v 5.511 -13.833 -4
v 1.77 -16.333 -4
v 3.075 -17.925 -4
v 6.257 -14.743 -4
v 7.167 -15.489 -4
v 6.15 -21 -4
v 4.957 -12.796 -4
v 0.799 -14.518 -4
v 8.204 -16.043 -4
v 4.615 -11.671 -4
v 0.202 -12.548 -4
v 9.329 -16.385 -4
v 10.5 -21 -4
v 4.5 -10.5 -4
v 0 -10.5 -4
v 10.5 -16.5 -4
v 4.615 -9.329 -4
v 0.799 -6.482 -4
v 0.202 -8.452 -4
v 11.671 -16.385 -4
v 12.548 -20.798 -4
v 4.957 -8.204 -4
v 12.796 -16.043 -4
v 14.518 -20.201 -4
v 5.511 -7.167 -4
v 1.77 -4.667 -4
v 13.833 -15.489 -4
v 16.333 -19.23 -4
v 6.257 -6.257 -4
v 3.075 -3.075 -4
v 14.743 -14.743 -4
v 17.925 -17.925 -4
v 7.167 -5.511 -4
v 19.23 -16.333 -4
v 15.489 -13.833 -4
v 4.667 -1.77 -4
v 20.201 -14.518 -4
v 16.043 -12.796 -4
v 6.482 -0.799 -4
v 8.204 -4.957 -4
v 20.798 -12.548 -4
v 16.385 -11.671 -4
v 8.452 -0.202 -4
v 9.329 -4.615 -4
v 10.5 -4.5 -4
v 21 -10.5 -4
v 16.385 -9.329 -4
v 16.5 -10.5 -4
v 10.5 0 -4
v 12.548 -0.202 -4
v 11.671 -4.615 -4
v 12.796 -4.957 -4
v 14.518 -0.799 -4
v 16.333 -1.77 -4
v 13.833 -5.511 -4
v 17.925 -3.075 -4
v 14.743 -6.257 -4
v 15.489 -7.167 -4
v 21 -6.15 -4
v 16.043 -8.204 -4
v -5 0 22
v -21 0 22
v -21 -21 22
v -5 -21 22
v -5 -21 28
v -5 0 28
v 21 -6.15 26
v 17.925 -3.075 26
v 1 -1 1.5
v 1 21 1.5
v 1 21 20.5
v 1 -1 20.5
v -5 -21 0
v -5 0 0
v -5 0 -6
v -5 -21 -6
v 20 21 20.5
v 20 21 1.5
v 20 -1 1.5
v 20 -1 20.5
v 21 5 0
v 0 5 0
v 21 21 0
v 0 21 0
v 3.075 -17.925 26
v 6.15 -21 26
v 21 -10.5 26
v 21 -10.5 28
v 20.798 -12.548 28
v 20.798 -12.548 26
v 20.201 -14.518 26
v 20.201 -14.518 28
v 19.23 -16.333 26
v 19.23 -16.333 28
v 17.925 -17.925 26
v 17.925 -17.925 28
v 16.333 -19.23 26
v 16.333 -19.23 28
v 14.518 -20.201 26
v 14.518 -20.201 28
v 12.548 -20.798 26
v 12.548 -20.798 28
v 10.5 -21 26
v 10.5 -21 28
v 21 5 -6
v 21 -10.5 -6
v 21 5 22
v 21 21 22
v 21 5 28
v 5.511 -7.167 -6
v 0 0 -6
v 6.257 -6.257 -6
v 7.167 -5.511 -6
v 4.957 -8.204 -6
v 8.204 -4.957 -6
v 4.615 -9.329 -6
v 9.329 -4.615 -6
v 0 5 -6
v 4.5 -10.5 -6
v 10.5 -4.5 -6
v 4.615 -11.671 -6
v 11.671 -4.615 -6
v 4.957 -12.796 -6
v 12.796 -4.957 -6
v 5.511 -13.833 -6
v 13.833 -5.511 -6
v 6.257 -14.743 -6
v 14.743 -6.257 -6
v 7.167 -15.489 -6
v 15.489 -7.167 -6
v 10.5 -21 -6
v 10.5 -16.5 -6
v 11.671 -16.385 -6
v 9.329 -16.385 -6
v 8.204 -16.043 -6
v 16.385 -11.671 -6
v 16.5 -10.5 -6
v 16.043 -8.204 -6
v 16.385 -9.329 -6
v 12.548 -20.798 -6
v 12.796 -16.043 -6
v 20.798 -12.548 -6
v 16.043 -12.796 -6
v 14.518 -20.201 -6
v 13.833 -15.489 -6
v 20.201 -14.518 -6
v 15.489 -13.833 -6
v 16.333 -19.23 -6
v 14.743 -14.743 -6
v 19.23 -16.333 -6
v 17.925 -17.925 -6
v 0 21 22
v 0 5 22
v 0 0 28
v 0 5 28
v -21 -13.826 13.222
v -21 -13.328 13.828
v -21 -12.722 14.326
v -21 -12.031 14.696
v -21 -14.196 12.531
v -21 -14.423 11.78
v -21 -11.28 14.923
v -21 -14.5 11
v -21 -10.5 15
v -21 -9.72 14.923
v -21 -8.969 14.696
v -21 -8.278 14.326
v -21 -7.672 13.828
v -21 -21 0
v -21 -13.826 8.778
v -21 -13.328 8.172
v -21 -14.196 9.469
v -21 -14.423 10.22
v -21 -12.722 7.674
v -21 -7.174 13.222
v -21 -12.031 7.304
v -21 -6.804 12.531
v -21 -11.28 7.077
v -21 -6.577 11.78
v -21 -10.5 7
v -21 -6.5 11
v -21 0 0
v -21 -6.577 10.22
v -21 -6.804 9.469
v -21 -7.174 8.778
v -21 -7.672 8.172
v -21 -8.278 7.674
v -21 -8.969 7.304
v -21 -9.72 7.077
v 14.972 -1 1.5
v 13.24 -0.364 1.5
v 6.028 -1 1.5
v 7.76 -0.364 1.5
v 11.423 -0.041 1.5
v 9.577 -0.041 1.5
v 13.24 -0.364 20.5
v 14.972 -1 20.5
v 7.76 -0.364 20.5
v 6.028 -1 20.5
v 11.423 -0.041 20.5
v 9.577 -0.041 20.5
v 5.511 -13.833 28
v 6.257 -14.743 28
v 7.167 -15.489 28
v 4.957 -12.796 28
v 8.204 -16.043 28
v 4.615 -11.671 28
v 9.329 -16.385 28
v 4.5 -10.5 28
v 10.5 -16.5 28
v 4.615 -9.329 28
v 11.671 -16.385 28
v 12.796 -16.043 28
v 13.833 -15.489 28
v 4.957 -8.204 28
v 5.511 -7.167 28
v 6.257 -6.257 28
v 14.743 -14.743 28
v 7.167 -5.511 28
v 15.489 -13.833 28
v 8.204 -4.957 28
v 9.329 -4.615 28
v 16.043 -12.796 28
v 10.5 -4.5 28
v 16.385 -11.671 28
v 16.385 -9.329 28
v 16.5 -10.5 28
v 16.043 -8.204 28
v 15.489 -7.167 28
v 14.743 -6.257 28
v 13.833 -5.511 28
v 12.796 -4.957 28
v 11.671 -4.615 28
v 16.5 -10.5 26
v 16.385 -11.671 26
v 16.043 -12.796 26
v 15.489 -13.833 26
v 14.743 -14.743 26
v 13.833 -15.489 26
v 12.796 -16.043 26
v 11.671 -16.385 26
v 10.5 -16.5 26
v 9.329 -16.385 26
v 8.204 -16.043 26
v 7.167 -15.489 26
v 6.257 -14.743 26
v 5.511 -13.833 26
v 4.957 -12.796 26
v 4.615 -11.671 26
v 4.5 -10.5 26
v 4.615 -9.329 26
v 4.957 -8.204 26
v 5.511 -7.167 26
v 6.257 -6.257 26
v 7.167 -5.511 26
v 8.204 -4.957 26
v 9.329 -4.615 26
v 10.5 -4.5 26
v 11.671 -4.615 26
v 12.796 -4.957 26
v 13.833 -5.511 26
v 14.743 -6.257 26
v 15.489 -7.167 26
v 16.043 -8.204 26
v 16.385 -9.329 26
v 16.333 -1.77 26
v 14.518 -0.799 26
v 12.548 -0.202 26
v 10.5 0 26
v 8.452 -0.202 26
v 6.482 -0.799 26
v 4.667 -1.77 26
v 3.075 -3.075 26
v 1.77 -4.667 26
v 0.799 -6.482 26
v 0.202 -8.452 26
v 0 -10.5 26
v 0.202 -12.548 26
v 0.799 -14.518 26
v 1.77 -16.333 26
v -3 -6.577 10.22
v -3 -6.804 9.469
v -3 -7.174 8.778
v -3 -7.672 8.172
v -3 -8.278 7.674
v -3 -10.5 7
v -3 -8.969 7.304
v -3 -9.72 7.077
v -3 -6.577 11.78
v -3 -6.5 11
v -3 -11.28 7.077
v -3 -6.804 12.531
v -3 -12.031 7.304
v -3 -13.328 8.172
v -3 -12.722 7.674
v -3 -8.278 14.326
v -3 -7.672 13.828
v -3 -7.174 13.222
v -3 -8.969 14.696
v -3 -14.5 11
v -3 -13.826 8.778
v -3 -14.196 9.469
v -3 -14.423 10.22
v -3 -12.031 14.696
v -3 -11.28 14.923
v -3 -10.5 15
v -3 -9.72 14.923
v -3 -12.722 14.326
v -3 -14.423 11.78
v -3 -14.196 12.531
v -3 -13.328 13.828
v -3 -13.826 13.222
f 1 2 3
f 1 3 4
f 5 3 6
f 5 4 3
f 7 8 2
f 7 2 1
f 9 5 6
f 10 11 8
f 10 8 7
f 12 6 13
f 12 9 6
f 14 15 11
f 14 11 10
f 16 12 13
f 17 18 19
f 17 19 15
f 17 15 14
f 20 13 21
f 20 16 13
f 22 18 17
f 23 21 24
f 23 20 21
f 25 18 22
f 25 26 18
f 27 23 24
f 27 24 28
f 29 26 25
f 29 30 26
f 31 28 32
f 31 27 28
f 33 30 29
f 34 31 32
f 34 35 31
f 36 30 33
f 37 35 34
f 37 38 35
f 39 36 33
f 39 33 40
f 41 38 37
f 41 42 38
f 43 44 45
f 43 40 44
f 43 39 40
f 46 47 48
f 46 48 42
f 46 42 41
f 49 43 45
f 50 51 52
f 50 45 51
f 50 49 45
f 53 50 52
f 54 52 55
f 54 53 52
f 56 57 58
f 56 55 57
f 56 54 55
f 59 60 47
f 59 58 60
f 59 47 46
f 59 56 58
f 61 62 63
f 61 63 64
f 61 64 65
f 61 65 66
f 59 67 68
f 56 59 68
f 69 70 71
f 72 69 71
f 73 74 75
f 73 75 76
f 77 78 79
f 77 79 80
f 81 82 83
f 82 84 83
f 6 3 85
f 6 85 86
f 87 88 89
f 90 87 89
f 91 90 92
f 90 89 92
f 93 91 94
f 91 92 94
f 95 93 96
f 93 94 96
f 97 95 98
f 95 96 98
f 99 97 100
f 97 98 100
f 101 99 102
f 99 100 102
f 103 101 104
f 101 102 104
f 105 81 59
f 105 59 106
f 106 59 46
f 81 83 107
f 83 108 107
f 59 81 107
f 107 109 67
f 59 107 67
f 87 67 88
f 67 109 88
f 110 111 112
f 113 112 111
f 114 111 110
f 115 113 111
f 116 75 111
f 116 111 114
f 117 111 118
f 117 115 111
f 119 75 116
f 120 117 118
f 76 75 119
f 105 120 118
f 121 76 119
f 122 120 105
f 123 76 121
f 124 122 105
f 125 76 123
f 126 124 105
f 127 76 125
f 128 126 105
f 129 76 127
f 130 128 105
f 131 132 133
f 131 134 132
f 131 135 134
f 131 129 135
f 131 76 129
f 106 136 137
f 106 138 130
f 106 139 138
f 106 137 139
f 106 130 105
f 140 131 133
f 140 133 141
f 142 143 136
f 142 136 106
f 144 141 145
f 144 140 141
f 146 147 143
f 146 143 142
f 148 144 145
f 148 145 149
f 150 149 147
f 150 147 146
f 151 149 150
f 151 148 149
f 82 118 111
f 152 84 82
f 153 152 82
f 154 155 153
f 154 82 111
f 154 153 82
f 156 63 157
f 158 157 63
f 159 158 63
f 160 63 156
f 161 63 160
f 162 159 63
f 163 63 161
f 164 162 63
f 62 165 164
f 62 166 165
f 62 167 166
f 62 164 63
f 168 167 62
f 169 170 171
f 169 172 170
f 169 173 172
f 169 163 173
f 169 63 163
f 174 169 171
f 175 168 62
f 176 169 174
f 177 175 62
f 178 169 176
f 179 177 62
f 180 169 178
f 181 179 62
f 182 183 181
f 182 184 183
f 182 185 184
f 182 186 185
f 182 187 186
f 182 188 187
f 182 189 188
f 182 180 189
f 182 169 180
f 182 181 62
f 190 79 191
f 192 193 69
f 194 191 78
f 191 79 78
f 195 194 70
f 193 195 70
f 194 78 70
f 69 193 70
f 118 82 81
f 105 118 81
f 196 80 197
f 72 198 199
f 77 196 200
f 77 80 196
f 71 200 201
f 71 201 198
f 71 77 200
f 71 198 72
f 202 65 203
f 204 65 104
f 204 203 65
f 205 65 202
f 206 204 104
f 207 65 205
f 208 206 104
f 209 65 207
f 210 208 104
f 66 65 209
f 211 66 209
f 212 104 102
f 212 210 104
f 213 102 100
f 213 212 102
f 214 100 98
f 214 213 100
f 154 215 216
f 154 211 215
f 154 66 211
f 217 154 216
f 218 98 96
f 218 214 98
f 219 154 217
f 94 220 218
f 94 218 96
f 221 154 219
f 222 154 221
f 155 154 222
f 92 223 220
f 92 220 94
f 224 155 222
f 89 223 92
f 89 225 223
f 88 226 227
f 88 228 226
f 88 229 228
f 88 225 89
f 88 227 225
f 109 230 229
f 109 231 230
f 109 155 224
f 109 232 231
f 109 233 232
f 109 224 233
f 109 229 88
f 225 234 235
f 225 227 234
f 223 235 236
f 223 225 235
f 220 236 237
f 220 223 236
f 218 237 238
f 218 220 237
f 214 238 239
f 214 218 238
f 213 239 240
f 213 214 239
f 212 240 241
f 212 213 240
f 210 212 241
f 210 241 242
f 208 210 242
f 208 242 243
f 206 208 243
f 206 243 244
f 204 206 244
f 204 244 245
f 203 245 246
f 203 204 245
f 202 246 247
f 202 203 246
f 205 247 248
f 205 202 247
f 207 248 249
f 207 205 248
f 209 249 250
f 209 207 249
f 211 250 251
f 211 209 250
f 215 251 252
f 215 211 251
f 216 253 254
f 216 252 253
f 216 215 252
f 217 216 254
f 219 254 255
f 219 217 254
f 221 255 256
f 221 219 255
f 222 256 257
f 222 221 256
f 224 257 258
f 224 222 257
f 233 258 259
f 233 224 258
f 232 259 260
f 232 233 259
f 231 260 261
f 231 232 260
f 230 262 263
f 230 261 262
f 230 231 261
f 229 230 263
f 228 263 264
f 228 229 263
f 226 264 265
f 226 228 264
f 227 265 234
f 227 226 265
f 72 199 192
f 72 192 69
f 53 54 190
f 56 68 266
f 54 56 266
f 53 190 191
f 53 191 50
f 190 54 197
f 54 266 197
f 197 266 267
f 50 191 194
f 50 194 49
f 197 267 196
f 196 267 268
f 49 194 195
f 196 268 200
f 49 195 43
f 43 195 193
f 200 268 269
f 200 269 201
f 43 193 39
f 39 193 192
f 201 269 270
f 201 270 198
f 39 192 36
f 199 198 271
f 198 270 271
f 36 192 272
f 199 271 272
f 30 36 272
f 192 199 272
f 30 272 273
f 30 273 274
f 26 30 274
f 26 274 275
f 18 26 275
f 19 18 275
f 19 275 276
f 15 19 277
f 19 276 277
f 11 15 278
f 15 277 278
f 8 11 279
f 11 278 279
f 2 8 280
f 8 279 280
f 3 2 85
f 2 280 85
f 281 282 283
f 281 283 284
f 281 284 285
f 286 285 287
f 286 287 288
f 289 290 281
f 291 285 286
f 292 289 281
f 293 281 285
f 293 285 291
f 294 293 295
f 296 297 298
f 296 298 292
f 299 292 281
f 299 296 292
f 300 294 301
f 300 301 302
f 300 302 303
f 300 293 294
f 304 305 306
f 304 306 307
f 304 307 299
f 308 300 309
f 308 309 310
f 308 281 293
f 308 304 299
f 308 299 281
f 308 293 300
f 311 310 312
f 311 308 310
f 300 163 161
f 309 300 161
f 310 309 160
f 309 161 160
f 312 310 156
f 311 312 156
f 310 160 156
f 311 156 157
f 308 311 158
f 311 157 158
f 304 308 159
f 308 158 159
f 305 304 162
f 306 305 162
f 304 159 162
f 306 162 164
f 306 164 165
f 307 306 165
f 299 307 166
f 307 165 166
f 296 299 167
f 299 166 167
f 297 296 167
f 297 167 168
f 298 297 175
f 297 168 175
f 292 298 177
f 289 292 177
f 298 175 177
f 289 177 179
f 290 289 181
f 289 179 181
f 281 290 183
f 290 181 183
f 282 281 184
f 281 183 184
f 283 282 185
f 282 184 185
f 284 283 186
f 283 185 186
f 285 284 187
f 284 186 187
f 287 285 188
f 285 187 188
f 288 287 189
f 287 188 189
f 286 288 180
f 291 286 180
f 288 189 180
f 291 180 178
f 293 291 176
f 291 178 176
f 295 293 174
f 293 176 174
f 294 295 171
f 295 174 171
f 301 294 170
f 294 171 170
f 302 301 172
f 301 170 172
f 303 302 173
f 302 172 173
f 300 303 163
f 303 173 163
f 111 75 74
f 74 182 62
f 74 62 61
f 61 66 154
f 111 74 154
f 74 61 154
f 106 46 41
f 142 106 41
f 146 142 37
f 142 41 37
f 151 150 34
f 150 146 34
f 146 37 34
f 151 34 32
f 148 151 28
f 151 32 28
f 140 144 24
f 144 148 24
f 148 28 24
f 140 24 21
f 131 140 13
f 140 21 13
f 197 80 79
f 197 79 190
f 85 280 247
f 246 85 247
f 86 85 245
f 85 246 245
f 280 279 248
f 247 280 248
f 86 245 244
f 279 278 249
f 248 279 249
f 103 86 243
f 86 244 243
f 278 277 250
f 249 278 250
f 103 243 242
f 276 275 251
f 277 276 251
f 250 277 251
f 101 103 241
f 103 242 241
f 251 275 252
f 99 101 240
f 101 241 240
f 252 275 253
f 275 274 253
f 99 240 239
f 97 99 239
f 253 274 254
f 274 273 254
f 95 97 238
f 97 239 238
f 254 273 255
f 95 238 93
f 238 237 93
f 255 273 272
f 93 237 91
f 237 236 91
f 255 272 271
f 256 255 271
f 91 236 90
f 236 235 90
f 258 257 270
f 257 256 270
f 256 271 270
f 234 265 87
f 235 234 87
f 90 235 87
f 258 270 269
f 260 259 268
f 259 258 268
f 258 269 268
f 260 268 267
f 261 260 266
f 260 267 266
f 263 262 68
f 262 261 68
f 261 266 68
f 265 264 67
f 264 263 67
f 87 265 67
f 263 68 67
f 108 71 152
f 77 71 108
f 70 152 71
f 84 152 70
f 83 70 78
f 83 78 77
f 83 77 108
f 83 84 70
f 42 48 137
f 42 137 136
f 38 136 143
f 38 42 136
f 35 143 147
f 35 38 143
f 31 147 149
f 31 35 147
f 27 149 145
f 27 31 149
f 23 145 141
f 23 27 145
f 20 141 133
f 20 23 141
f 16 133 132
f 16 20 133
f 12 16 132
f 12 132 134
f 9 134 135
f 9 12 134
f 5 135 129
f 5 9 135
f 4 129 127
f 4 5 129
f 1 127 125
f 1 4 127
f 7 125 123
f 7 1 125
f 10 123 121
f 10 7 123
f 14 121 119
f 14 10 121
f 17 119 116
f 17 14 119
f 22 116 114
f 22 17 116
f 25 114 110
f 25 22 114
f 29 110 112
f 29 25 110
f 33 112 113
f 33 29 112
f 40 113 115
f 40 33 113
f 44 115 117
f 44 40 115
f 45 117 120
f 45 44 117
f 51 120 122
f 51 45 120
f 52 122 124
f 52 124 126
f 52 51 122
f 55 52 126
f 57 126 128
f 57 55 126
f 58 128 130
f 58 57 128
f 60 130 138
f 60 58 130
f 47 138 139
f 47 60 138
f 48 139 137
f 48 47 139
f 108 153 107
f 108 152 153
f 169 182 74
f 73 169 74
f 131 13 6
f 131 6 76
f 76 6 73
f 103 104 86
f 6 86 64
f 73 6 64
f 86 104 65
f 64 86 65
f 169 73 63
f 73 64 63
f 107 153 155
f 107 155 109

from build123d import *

# Parameters (mm, degrees)
F0_W      = 42
F0_H      = 42
F1_DEPTH  = 22
F2_W      = 21
F2_H      = 21
F3_DEPTH  = 22
F4_R      = 6
F5_DEPTH  = 22
F6_R      = 4
F7_DEPTH  = 18
F8_W      = 19
F8_H      = 19
F9_DEPTH  = 22
F10_W     = 21
F10_H     = 21
F10_R     = 6
F10_H_2   = 5
F10_W_2   = 5
F11_DEPTH = 6
F12_W     = 21
F12_H     = 21
F12_R     = 6
F12_W_2   = 5
F12_H_2   = 5
F13_DEPTH = 6
F15_R     = 6
F16_DEPTH = 15
F18_DEPTH = 34.001


with BuildPart() as f1:
    # F0 (on Top) → F1 (new body)
    with BuildSketch(Plane.XY):
        Rectangle(F0_W, F0_H)
    extrude(amount=F1_DEPTH)

    # F2 (on face) → F3 (cut, through all)
    with BuildSketch(Plane.XY.offset(22)):
        with Locations((-10.5, 10.5)):
            Rectangle(F2_W, F2_H)
    extrude(amount=-F3_DEPTH, mode=Mode.SUBTRACT)

    # F4 (on face) → F5 (cut, through all)
    with BuildSketch(Plane.XY.offset(22)):
        with Locations((10.5, -10.5)):
            Circle(F4_R)
    extrude(amount=-F5_DEPTH, mode=Mode.SUBTRACT)

    # F6 (on face) → F7 (cut)
    with BuildSketch(Plane(origin=(-21, 0, 0), x_dir=(0, -1, 0), z_dir=(-1, 0, 0))):
        with Locations((10.5, 11)):
            Circle(F6_R)
    extrude(amount=-F7_DEPTH, mode=Mode.SUBTRACT)

    # F8 (on face) → F9 (cut)
    with BuildSketch(Plane(origin=(0, 21, 0), x_dir=(-1, 0, 0), z_dir=(0, 1, 0))):
        with Locations((-10.5, 11)):
            Rectangle(F8_W, F8_H)
    extrude(amount=-F9_DEPTH, mode=Mode.SUBTRACT)

    # F10 (on face) → F11 (join)
    with BuildSketch(Plane.XY.offset(22)):
        with Locations((10.5, -10.5)):
            Rectangle(F10_W, F10_H)
        with Locations((10.5, -10.5)):
            Circle(F10_R, mode=Mode.SUBTRACT)
        with Locations((10.5, 2.5)):
            Rectangle(F10_W, F10_H_2)
        with Locations((-2.5, -10.5)):
            Rectangle(F10_W_2, F10_H)
    extrude(amount=F11_DEPTH)

    # F12 (on face) → F13 (join)
    with BuildSketch(Plane(origin=(0, 0, 0), x_dir=(1, 0, 0), z_dir=(0, 0, -1))):
        with Locations((10.5, 10.5)):
            Rectangle(F12_W, F12_H)
        with Locations((10.5, 10.5)):
            Circle(F12_R, mode=Mode.SUBTRACT)
        with Locations((-2.5, 10.5)):
            Rectangle(F12_W_2, F12_H)
        with Locations((10.5, -2.5)):
            Rectangle(F12_W, F12_H_2)
    extrude(amount=F13_DEPTH)

    # F15 (on offset) → F16 (cut, symmetric)
    with BuildSketch(Plane.XY.offset(11)):
        with BuildLine():
            Line((21, -21), (21, -10.5))
            ThreePointArc((21, -10.5), (17.9246212025, -17.9246212025), (10.5, -21))
            Line((10.5, -21), (21, -21))
        make_face()
        with BuildLine():
            Line((6.1503787975, -21), (10.5, -21))
            ThreePointArc((10.5, -21), (6.4818239602, -20.2007350914), (3.0753787975, -17.9246212025))
            Line((3.0753787975, -17.9246212025), (6.1503787975, -21))
        make_face()
        with BuildLine():
            ThreePointArc((17.9246212025, -3.0753787975), (20.2007350914, -6.4818239602), (21, -10.5))
            Line((21, -10.5), (21, -6.1503787975))
            Line((21, -6.1503787975), (17.9246212025, -3.0753787975))
        make_face()
        with BuildLine():
            ThreePointArc((10.5, -21), (17.9246212025, -17.9246212025), (21, -10.5))
            ThreePointArc((21, -10.5), (20.2007350914, -6.4818239602), (17.9246212025, -3.0753787975))
            ThreePointArc((17.9246212025, -3.0753787975), (3.0753787975, -3.0753787975), (3.0753787975, -17.9246212025))
            ThreePointArc((3.0753787975, -17.9246212025), (6.4818239602, -20.2007350914), (10.5, -21))
        make_face()
        with Locations((10.5, -10.5)):
            Circle(F15_R, mode=Mode.SUBTRACT)
    extrude(amount=F16_DEPTH, both=True, mode=Mode.SUBTRACT)

    # F17 (on face) → F18 (cut, through all)
    with BuildSketch(Plane.XY.offset(28)):
        with BuildLine():
            Line((21, -21), (21, -10.5))
            ThreePointArc((21, -10.5), (17.9246212025, -17.9246212025), (10.5, -21))
            Line((10.5, -21), (21, -21))
        make_face()
    extrude(amount=-F18_DEPTH, mode=Mode.SUBTRACT)


solid = f1.part
